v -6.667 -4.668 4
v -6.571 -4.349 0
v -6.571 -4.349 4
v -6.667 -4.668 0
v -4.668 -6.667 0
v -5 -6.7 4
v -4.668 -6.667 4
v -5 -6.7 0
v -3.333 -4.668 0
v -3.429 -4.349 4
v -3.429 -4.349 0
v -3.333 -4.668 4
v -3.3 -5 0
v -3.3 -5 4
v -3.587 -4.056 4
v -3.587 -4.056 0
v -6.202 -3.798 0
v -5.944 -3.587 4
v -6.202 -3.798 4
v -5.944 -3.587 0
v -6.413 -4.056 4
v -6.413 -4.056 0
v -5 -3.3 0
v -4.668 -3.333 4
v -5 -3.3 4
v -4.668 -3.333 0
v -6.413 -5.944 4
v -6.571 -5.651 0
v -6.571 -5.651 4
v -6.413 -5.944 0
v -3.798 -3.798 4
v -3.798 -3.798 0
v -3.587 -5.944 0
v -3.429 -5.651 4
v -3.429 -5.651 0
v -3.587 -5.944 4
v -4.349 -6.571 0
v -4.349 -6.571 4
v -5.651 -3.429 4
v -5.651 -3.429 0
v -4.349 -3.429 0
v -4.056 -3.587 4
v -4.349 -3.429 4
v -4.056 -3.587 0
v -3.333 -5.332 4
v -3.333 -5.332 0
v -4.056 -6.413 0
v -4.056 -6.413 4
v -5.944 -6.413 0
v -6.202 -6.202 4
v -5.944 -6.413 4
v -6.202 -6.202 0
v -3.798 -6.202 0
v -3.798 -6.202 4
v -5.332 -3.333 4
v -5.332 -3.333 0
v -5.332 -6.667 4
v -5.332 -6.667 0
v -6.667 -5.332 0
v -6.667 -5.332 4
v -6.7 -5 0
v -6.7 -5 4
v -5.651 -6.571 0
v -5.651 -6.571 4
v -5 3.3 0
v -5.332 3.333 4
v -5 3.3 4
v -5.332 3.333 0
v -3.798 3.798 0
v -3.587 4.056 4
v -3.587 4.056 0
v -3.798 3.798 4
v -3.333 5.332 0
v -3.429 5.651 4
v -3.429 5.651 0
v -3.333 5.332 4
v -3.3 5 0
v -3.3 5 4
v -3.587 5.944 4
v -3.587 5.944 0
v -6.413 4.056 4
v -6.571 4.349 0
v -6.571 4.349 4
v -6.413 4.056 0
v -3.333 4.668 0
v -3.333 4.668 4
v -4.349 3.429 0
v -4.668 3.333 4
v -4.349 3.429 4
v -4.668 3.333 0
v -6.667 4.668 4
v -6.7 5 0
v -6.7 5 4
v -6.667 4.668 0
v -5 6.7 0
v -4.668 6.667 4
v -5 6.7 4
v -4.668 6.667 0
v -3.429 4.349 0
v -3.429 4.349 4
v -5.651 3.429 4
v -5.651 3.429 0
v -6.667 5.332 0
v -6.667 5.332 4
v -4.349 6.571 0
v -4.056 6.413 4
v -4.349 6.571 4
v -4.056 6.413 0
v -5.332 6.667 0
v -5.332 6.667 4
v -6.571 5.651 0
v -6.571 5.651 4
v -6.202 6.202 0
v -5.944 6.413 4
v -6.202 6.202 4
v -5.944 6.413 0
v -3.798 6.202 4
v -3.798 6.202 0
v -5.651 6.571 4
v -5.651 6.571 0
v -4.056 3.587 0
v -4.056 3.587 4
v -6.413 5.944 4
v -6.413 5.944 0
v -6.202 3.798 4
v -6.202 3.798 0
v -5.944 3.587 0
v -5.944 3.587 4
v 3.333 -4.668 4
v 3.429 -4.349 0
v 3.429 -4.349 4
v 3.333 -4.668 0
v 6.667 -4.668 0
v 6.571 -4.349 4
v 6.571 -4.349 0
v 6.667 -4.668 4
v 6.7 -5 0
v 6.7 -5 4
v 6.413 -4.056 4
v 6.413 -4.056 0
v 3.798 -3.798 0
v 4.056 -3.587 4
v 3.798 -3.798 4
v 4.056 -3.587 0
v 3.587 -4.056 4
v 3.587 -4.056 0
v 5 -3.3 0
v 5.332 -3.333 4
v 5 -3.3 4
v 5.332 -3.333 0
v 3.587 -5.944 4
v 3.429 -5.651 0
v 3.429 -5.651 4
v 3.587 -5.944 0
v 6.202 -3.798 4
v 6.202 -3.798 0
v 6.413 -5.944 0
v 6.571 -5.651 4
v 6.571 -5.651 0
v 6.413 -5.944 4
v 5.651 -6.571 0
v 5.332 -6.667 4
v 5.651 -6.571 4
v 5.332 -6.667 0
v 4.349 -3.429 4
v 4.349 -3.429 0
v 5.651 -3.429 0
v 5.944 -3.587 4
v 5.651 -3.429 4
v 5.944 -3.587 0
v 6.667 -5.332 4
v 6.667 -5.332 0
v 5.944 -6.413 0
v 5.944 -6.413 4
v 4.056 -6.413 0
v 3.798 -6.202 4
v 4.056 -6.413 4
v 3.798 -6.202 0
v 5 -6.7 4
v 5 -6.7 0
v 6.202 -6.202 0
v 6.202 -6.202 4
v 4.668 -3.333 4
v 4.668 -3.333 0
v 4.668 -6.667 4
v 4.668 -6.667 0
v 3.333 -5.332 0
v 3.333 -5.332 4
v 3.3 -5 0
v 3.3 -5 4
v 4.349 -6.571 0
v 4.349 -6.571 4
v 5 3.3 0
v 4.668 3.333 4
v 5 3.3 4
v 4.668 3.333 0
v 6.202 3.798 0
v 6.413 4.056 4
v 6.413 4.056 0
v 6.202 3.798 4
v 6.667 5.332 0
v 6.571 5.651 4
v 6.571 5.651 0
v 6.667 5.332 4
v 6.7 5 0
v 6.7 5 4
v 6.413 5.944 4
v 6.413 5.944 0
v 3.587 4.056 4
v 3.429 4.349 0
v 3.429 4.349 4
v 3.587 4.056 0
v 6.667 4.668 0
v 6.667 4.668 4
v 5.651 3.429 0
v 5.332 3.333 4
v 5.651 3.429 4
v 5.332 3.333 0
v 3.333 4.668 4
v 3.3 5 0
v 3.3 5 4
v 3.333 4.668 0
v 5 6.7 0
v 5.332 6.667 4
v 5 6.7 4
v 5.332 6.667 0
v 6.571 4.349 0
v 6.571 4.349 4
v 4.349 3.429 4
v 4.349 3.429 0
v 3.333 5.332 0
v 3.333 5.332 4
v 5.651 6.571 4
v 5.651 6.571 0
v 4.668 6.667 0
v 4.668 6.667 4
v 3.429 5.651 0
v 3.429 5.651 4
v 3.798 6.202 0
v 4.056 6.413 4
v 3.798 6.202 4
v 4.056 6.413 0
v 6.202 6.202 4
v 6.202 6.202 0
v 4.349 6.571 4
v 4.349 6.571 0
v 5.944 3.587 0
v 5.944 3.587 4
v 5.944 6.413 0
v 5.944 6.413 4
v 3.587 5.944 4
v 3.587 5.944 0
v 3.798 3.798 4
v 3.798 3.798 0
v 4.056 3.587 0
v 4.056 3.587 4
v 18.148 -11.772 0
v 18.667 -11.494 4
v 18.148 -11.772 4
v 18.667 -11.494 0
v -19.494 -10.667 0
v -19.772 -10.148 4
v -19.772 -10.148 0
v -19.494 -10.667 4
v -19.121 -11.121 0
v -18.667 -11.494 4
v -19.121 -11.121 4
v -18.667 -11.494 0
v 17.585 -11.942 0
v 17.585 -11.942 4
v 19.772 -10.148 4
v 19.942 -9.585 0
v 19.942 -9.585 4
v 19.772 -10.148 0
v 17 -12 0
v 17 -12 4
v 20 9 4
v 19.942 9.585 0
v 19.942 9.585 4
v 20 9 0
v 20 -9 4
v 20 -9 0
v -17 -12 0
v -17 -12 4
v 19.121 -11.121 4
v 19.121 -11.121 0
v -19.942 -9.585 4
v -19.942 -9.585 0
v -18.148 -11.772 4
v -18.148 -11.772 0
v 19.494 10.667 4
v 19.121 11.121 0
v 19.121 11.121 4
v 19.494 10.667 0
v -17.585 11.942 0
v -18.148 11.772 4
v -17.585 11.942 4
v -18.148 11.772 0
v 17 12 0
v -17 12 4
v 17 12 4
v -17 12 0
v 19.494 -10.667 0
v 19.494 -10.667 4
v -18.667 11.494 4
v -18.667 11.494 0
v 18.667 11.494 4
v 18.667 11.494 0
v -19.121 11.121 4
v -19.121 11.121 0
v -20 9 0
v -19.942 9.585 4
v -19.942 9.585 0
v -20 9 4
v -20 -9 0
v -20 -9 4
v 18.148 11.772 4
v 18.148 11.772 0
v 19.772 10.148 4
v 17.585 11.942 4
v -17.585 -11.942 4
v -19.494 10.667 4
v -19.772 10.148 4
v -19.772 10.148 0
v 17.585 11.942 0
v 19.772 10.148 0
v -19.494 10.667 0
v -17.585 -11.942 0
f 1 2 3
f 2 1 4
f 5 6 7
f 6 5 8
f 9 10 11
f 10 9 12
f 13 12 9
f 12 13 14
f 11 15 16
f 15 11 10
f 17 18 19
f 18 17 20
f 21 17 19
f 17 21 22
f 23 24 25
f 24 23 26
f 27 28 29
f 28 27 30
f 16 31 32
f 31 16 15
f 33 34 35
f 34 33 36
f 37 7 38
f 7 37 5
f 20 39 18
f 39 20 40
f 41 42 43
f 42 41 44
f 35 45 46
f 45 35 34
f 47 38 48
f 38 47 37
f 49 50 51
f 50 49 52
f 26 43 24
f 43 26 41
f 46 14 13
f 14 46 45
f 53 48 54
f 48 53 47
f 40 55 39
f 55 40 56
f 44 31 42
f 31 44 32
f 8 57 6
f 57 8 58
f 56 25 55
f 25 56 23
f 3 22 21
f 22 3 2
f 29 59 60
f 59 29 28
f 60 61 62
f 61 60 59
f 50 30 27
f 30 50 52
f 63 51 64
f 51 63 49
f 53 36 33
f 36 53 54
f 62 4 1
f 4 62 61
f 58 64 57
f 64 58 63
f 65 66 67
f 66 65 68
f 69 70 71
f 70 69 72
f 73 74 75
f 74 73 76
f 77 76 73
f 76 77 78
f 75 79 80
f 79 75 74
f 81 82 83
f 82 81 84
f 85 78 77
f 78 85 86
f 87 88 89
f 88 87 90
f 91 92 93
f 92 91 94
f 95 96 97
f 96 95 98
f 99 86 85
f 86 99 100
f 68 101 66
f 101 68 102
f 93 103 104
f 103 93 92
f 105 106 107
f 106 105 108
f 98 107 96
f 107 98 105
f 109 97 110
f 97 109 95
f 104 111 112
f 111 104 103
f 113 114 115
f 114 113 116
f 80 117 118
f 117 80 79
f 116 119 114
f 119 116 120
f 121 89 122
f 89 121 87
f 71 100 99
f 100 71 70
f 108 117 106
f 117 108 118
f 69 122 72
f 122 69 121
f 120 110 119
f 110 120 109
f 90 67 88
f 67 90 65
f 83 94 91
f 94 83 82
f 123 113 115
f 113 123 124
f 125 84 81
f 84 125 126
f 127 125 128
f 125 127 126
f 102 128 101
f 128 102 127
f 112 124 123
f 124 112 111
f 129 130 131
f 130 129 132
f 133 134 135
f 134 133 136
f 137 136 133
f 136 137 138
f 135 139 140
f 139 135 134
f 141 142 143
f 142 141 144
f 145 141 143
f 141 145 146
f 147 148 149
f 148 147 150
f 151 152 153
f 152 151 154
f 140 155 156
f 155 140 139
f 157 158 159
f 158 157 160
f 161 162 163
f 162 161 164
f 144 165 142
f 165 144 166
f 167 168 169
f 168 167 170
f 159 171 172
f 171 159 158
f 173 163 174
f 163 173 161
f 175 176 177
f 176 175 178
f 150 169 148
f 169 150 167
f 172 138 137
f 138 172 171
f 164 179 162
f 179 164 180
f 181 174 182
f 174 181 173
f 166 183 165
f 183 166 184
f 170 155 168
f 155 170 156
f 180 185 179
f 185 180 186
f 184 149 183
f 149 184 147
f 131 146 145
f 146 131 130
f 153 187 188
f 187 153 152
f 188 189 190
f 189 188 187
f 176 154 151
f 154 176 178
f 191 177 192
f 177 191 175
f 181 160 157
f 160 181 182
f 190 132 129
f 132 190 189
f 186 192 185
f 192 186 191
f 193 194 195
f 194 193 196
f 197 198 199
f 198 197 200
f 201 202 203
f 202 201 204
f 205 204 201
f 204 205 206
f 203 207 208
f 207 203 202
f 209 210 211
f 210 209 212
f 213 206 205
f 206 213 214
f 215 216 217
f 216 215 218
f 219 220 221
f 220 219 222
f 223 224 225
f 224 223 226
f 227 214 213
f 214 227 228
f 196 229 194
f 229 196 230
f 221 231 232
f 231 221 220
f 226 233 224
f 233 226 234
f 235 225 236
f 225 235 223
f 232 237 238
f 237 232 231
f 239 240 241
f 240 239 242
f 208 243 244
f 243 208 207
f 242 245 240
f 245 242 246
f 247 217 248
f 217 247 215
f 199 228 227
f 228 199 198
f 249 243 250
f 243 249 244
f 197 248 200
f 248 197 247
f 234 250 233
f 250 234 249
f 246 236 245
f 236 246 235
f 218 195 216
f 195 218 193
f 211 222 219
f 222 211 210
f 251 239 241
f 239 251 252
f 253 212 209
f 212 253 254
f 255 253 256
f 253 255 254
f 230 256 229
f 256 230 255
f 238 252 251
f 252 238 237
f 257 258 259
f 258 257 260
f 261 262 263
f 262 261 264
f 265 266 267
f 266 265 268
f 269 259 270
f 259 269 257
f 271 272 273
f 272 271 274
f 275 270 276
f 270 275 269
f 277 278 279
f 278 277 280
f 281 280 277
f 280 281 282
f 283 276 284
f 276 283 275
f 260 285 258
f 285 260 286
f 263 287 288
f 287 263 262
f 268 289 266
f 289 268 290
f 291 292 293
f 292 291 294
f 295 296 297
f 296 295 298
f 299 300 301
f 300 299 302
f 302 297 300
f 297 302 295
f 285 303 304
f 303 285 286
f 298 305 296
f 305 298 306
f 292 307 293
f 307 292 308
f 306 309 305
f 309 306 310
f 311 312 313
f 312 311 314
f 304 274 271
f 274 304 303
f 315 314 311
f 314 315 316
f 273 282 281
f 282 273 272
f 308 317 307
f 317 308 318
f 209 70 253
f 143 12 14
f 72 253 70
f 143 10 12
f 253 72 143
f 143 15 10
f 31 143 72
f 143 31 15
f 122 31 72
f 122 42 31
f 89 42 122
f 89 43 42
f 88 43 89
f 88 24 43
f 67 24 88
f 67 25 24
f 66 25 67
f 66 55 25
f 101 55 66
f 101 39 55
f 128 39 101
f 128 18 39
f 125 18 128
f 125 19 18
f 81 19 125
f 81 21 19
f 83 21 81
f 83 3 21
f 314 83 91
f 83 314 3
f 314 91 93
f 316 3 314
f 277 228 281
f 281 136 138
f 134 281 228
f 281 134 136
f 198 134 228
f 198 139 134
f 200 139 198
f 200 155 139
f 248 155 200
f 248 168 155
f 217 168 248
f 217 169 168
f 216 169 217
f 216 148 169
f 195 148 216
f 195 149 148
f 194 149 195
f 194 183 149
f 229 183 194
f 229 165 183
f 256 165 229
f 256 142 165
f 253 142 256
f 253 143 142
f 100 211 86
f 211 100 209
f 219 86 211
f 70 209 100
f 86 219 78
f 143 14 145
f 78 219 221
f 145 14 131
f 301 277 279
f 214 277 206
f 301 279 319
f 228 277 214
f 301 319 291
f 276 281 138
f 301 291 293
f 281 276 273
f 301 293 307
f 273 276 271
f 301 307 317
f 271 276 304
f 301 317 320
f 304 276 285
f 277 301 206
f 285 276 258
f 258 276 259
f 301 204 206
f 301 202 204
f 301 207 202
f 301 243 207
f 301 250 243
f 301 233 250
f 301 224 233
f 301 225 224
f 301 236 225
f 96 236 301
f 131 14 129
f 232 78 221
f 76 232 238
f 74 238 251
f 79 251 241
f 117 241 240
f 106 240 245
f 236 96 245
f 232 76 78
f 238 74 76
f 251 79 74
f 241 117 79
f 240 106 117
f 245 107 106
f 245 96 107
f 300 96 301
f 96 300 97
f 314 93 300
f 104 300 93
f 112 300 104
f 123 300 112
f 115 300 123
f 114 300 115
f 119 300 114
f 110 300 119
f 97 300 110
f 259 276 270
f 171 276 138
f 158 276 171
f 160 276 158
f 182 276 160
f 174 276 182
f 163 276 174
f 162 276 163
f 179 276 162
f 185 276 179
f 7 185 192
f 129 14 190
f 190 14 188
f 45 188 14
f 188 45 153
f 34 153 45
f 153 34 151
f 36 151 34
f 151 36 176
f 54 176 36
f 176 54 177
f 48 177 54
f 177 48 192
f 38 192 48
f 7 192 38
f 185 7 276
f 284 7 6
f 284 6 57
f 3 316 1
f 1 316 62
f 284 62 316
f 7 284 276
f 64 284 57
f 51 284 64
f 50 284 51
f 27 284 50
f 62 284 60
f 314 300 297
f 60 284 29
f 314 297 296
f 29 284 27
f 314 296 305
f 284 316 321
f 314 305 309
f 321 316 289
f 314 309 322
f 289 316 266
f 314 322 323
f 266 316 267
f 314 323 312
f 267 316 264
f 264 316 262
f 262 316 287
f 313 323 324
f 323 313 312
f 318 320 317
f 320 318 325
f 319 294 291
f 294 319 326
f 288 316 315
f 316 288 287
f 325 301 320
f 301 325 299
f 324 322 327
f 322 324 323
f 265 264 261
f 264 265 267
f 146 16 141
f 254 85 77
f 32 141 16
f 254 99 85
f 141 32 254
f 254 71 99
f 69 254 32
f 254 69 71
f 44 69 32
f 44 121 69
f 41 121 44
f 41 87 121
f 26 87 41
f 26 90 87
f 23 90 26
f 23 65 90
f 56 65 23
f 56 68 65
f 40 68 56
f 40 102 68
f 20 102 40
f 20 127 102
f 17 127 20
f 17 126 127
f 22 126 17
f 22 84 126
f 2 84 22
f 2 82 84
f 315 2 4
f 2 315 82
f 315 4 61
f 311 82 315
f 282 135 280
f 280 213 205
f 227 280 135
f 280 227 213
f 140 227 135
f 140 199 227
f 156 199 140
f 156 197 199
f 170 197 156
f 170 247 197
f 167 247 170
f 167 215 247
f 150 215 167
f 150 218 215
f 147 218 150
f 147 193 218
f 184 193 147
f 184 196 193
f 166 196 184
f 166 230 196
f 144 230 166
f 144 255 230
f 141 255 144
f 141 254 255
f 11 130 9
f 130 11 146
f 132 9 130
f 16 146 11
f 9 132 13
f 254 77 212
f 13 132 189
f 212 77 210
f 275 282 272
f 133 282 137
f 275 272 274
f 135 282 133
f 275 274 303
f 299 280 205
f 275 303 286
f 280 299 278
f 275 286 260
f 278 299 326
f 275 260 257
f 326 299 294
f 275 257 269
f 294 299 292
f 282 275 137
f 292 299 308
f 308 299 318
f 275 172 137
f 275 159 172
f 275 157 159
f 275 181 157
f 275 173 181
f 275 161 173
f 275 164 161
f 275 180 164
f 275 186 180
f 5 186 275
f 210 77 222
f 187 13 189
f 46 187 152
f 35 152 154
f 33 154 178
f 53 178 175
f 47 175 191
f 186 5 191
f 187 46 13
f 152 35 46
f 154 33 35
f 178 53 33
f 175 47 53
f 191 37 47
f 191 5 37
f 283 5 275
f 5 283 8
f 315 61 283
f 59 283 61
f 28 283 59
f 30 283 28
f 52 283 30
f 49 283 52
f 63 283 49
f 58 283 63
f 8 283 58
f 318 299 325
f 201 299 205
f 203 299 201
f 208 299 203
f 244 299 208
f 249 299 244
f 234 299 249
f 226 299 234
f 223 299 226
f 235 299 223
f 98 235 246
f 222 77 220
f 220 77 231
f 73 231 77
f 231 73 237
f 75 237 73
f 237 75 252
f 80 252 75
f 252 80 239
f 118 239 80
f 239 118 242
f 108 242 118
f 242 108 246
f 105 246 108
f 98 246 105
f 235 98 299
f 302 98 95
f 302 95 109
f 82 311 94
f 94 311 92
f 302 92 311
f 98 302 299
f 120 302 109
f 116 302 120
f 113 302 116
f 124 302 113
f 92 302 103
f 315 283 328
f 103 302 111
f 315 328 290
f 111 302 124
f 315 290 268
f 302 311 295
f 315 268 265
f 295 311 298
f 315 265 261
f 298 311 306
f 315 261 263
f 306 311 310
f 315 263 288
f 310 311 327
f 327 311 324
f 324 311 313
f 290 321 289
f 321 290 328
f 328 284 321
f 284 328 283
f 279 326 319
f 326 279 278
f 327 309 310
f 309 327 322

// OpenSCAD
// file: rm_common.scad
// RobotMind: solid, double-sided panels with one blind mounting interface.
// One port does two jobs: press-fit peg (carriers) or bolted joint via an
// M3 brass heat-set insert (links). All dimensions are millimetres.
$fn = 32;

RM_EPS = 0.1;
RM_UNIT = 40;
RM_GRID = 10;
RM_EDGE_MARGIN = RM_GRID/2;
RM_PANEL_T = 8;
RM_CORNER_R = 3;
RM_FIT = 0; // positive is looser; tune in 0.05 mm steps

// One hexagonal blind port. The hexagonal ring accepts a tool-free peg; the
// central bore seats an M3 brass heat-set insert for bolted links.
RM_PORT_OD = 8;       // hexagon corner-to-corner
RM_PORT_DEPTH = 2.2;  // hex ring depth
RM_INSERT_OD = 4.0;   // M3 brass knurled heat-set insert, outer diameter
RM_INSERT_BORE = 3.4; // printed blind bore for the insert (melt-press fit)
RM_INSERT_DEPTH = 3.0;// blind bore depth; 2x this must stay under panel thickness
RM_PEG_BORE = RM_INSERT_OD+0.2; // peg centre bore clears a seated insert
RM_PEG_ENTRY = 0.2;
RM_PEG_GRIP = 0.2;

RM_M3_CLEARANCE = 3.4;
RM_M3_HEAD_D = 6.2;
RM_M3_HEAD_DEPTH = 2;

// Bolted links. Brackets screw into heat-set inserts seated in panel ports.
RM_LINK_T = 4;   // bracket thickness
RM_LINK_W = 24;  // bracket width across the seam
RM_LINK_ROW = RM_GRID/2;                       // flat rows: 5 mm off the seam
RM_CORNER_ROW = RM_UNIT/2-RM_PANEL_T-RM_EDGE_MARGIN; // 7: fold to first row

function rm_port_od() = RM_PORT_OD+2*RM_FIT;
function rm_insert_bore() = RM_INSERT_BORE+2*RM_FIT;
function rm_peg_root_od(delta=0) = RM_PORT_OD+RM_PEG_GRIP-2*RM_FIT+delta;
function rm_peg_tip_od(delta=0) = RM_PORT_OD-RM_PEG_ENTRY-2*RM_FIT+delta;

function grid_count(span) = floor((span-2*RM_EDGE_MARGIN)/RM_GRID)+1;
function grid_position(i,span) = -span/2+RM_EDGE_MARGIN+i*RM_GRID;
function link_cols(length) =
  [for(k=[0:length/RM_UNIT-1]) RM_GRID/2+2*RM_GRID*k];
function link_hole_xs(length) =
  [for(x=link_cols(length), t=[-1,1]) t*x];

assert(RM_UNIT%RM_GRID == 0, "The unit must contain a whole mounting grid");
assert(grid_count(RM_UNIT) == 4,
       "The 40 mm unit must expose a 4x4 port grid");
assert(RM_PANEL_T-RM_INSERT_DEPTH >= RM_INSERT_DEPTH,
       "Opposed face insert bores must not meet through the membrane");
assert(RM_PANEL_T-RM_INSERT_DEPTH >= 2,
       "Blind insert bore needs a continuous membrane");
assert(RM_INSERT_BORE >= RM_M3_CLEARANCE,
       "Insert bore must clear the M3 shaft");
assert(RM_PEG_BORE > RM_INSERT_OD, "Peg bore must clear a seated insert");
assert(rm_peg_root_od() > rm_port_od() &&
       rm_port_od() > rm_peg_tip_od(),
       "RM_FIT is outside the hexagonal peg range");
assert(RM_GRID-RM_PORT_OD > 1,
       "Mounting ports need enough material between them");
assert(RM_PORT_OD > RM_INSERT_BORE+3,
       "Hex ring needs walls around the insert bore");

module rounded_box(size=[20,20,3], r=2) {
  linear_extrude(height=size[2])
    offset(r=r) offset(delta=-r) square([size[0],size[1]]);
}

module rounded_panel(size=[RM_UNIT,RM_UNIT], t=RM_PANEL_T,
                     r=RM_CORNER_R) {
  translate([-size[0]/2,-size[1]/2,0]) rounded_box([size[0],size[1],t],r);
}

// Cut from a face at Z=0 into material extending in +Z. One blind port:
// hexagonal ring for the press-fit peg, central bore as insert seat.
module blind_port_cut(depth=RM_PORT_DEPTH,
                      bore_d=rm_insert_bore(),
                      bore_depth=RM_INSERT_DEPTH) {
  union() {
    translate([0,0,-RM_EPS])
      cylinder(h=depth+RM_EPS,d=rm_port_od(),$fn=6);
    translate([0,0,-RM_EPS])
      cylinder(h=bore_depth+RM_EPS,d=bore_d);
  }
}

module face_port_cuts(size=[RM_UNIT,RM_UNIT], top=false) {
  for(ix=[0:grid_count(size[0])-1], iy=[0:grid_count(size[1])-1]) {
    p=[grid_position(ix,size[0]),grid_position(iy,size[1])];
    if(top)
      translate([p[0],p[1],RM_PANEL_T]) mirror([0,0,1]) blind_port_cut();
    else
      translate([p[0],p[1],0]) blind_port_cut();
  }
}

module panel(size=[RM_UNIT,RM_UNIT]) {
  assert(size[0]%RM_UNIT == 0 && size[1]%RM_UNIT == 0,
         "Panel dimensions must be whole 40 mm units");
  difference() {
    rounded_panel(size);
    face_port_cuts(size);
    face_port_cuts(size,true);
  }
}

// Every carrier reuses this exact integral peg: solid hex frustum with a
// centre bore that clears a seated insert and passes an M3 screw.
module mount_peg(delta=0, h=RM_PORT_DEPTH) {
  difference() {
    cylinder(h=h,
             d1=rm_peg_root_od(delta),d2=rm_peg_tip_od(delta),$fn=6);
    translate([0,0,-RM_EPS])
      cylinder(h=h+2*RM_EPS,d=RM_PEG_BORE);
  }
}

// Cut from an exposed surface at Z=0 into material extending in +Z.
module optional_screw_cut(depth=RM_PANEL_T) {
  translate([0,0,-RM_EPS])
    cylinder(h=depth+2*RM_EPS,d=RM_M3_CLEARANCE);
  translate([0,0,-RM_EPS])
    cylinder(h=RM_M3_HEAD_DEPTH+RM_EPS,d=RM_M3_HEAD_D);
}

// Bolted links. Both print flat, features up, support-free; screw heads sit
// proud of the bracket (no counterbore). Rows land on the seam-adjacent port
// rows; columns repeat every 20 mm along the seam.

// One M3 pass-through hole: shaft clearance, drilled right through a 4 mm
// bracket in +Z, or in +Y for the fold leg of an angle link.
module link_bolt_hole(x, y, up=true) {
  if(up) translate([x,y,-RM_EPS])
    cylinder(h=RM_LINK_T+2*RM_EPS,d=RM_M3_CLEARANCE);
  else translate([x,y,0]) rotate([90,0,0])
    cylinder(h=RM_LINK_T+2*RM_EPS,d=RM_M3_CLEARANCE);
}

// flat_link(length): bridges a coplanar seam. Holes at +/-5 mm off the
// seam line (the two seam-adjacent port rows of each panel).
module flat_link(length=RM_UNIT) {
  assert(length%RM_UNIT == 0, "Link length must use 40 mm units");
  difference() {
    translate([-length/2,-RM_LINK_W/2,0])
      rounded_box([length,RM_LINK_W,RM_LINK_T],3);
    for(x=link_hole_xs(length), y=[-RM_LINK_ROW,RM_LINK_ROW])
      link_bolt_hole(x,y);
  }
}

// angle_link(length): a 90-degree bracket for box corners. The fold line
// sits at the inner corner; the floor leg extends -Y, the wall leg +Z, so
// holes land on the first two free port rows of each panel.
module angle_link(length=RM_UNIT) {
  assert(length%RM_UNIT == 0, "Link length must use 40 mm units");
  ys=[-RM_CORNER_ROW-RM_GRID, -RM_CORNER_ROW];
  difference() {
    union() {
      translate([-length/2,-RM_LINK_W,0])
        rounded_box([length,RM_LINK_W,RM_LINK_T],3);
      translate([-length/2,-RM_LINK_T,0]) rotate([90,0,0])
        rounded_box([length,RM_LINK_W,RM_LINK_T],3);
    }
    for(x=link_hole_xs(length), y=ys, up=[true,false])
      link_bolt_hole(x,y,up=up);
  }
}
// main file
include <rm_common.scad>

PART="flat"; // flat or angle
LENGTH=40;   // 40 or 80 mm
assert(PART=="flat" || PART=="angle", "Unknown link");
assert(LENGTH%RM_UNIT == 0, "Link length must use 40 mm units");

if(PART=="flat") flat_link(LENGTH);
if(PART=="angle") angle_link(LENGTH);
